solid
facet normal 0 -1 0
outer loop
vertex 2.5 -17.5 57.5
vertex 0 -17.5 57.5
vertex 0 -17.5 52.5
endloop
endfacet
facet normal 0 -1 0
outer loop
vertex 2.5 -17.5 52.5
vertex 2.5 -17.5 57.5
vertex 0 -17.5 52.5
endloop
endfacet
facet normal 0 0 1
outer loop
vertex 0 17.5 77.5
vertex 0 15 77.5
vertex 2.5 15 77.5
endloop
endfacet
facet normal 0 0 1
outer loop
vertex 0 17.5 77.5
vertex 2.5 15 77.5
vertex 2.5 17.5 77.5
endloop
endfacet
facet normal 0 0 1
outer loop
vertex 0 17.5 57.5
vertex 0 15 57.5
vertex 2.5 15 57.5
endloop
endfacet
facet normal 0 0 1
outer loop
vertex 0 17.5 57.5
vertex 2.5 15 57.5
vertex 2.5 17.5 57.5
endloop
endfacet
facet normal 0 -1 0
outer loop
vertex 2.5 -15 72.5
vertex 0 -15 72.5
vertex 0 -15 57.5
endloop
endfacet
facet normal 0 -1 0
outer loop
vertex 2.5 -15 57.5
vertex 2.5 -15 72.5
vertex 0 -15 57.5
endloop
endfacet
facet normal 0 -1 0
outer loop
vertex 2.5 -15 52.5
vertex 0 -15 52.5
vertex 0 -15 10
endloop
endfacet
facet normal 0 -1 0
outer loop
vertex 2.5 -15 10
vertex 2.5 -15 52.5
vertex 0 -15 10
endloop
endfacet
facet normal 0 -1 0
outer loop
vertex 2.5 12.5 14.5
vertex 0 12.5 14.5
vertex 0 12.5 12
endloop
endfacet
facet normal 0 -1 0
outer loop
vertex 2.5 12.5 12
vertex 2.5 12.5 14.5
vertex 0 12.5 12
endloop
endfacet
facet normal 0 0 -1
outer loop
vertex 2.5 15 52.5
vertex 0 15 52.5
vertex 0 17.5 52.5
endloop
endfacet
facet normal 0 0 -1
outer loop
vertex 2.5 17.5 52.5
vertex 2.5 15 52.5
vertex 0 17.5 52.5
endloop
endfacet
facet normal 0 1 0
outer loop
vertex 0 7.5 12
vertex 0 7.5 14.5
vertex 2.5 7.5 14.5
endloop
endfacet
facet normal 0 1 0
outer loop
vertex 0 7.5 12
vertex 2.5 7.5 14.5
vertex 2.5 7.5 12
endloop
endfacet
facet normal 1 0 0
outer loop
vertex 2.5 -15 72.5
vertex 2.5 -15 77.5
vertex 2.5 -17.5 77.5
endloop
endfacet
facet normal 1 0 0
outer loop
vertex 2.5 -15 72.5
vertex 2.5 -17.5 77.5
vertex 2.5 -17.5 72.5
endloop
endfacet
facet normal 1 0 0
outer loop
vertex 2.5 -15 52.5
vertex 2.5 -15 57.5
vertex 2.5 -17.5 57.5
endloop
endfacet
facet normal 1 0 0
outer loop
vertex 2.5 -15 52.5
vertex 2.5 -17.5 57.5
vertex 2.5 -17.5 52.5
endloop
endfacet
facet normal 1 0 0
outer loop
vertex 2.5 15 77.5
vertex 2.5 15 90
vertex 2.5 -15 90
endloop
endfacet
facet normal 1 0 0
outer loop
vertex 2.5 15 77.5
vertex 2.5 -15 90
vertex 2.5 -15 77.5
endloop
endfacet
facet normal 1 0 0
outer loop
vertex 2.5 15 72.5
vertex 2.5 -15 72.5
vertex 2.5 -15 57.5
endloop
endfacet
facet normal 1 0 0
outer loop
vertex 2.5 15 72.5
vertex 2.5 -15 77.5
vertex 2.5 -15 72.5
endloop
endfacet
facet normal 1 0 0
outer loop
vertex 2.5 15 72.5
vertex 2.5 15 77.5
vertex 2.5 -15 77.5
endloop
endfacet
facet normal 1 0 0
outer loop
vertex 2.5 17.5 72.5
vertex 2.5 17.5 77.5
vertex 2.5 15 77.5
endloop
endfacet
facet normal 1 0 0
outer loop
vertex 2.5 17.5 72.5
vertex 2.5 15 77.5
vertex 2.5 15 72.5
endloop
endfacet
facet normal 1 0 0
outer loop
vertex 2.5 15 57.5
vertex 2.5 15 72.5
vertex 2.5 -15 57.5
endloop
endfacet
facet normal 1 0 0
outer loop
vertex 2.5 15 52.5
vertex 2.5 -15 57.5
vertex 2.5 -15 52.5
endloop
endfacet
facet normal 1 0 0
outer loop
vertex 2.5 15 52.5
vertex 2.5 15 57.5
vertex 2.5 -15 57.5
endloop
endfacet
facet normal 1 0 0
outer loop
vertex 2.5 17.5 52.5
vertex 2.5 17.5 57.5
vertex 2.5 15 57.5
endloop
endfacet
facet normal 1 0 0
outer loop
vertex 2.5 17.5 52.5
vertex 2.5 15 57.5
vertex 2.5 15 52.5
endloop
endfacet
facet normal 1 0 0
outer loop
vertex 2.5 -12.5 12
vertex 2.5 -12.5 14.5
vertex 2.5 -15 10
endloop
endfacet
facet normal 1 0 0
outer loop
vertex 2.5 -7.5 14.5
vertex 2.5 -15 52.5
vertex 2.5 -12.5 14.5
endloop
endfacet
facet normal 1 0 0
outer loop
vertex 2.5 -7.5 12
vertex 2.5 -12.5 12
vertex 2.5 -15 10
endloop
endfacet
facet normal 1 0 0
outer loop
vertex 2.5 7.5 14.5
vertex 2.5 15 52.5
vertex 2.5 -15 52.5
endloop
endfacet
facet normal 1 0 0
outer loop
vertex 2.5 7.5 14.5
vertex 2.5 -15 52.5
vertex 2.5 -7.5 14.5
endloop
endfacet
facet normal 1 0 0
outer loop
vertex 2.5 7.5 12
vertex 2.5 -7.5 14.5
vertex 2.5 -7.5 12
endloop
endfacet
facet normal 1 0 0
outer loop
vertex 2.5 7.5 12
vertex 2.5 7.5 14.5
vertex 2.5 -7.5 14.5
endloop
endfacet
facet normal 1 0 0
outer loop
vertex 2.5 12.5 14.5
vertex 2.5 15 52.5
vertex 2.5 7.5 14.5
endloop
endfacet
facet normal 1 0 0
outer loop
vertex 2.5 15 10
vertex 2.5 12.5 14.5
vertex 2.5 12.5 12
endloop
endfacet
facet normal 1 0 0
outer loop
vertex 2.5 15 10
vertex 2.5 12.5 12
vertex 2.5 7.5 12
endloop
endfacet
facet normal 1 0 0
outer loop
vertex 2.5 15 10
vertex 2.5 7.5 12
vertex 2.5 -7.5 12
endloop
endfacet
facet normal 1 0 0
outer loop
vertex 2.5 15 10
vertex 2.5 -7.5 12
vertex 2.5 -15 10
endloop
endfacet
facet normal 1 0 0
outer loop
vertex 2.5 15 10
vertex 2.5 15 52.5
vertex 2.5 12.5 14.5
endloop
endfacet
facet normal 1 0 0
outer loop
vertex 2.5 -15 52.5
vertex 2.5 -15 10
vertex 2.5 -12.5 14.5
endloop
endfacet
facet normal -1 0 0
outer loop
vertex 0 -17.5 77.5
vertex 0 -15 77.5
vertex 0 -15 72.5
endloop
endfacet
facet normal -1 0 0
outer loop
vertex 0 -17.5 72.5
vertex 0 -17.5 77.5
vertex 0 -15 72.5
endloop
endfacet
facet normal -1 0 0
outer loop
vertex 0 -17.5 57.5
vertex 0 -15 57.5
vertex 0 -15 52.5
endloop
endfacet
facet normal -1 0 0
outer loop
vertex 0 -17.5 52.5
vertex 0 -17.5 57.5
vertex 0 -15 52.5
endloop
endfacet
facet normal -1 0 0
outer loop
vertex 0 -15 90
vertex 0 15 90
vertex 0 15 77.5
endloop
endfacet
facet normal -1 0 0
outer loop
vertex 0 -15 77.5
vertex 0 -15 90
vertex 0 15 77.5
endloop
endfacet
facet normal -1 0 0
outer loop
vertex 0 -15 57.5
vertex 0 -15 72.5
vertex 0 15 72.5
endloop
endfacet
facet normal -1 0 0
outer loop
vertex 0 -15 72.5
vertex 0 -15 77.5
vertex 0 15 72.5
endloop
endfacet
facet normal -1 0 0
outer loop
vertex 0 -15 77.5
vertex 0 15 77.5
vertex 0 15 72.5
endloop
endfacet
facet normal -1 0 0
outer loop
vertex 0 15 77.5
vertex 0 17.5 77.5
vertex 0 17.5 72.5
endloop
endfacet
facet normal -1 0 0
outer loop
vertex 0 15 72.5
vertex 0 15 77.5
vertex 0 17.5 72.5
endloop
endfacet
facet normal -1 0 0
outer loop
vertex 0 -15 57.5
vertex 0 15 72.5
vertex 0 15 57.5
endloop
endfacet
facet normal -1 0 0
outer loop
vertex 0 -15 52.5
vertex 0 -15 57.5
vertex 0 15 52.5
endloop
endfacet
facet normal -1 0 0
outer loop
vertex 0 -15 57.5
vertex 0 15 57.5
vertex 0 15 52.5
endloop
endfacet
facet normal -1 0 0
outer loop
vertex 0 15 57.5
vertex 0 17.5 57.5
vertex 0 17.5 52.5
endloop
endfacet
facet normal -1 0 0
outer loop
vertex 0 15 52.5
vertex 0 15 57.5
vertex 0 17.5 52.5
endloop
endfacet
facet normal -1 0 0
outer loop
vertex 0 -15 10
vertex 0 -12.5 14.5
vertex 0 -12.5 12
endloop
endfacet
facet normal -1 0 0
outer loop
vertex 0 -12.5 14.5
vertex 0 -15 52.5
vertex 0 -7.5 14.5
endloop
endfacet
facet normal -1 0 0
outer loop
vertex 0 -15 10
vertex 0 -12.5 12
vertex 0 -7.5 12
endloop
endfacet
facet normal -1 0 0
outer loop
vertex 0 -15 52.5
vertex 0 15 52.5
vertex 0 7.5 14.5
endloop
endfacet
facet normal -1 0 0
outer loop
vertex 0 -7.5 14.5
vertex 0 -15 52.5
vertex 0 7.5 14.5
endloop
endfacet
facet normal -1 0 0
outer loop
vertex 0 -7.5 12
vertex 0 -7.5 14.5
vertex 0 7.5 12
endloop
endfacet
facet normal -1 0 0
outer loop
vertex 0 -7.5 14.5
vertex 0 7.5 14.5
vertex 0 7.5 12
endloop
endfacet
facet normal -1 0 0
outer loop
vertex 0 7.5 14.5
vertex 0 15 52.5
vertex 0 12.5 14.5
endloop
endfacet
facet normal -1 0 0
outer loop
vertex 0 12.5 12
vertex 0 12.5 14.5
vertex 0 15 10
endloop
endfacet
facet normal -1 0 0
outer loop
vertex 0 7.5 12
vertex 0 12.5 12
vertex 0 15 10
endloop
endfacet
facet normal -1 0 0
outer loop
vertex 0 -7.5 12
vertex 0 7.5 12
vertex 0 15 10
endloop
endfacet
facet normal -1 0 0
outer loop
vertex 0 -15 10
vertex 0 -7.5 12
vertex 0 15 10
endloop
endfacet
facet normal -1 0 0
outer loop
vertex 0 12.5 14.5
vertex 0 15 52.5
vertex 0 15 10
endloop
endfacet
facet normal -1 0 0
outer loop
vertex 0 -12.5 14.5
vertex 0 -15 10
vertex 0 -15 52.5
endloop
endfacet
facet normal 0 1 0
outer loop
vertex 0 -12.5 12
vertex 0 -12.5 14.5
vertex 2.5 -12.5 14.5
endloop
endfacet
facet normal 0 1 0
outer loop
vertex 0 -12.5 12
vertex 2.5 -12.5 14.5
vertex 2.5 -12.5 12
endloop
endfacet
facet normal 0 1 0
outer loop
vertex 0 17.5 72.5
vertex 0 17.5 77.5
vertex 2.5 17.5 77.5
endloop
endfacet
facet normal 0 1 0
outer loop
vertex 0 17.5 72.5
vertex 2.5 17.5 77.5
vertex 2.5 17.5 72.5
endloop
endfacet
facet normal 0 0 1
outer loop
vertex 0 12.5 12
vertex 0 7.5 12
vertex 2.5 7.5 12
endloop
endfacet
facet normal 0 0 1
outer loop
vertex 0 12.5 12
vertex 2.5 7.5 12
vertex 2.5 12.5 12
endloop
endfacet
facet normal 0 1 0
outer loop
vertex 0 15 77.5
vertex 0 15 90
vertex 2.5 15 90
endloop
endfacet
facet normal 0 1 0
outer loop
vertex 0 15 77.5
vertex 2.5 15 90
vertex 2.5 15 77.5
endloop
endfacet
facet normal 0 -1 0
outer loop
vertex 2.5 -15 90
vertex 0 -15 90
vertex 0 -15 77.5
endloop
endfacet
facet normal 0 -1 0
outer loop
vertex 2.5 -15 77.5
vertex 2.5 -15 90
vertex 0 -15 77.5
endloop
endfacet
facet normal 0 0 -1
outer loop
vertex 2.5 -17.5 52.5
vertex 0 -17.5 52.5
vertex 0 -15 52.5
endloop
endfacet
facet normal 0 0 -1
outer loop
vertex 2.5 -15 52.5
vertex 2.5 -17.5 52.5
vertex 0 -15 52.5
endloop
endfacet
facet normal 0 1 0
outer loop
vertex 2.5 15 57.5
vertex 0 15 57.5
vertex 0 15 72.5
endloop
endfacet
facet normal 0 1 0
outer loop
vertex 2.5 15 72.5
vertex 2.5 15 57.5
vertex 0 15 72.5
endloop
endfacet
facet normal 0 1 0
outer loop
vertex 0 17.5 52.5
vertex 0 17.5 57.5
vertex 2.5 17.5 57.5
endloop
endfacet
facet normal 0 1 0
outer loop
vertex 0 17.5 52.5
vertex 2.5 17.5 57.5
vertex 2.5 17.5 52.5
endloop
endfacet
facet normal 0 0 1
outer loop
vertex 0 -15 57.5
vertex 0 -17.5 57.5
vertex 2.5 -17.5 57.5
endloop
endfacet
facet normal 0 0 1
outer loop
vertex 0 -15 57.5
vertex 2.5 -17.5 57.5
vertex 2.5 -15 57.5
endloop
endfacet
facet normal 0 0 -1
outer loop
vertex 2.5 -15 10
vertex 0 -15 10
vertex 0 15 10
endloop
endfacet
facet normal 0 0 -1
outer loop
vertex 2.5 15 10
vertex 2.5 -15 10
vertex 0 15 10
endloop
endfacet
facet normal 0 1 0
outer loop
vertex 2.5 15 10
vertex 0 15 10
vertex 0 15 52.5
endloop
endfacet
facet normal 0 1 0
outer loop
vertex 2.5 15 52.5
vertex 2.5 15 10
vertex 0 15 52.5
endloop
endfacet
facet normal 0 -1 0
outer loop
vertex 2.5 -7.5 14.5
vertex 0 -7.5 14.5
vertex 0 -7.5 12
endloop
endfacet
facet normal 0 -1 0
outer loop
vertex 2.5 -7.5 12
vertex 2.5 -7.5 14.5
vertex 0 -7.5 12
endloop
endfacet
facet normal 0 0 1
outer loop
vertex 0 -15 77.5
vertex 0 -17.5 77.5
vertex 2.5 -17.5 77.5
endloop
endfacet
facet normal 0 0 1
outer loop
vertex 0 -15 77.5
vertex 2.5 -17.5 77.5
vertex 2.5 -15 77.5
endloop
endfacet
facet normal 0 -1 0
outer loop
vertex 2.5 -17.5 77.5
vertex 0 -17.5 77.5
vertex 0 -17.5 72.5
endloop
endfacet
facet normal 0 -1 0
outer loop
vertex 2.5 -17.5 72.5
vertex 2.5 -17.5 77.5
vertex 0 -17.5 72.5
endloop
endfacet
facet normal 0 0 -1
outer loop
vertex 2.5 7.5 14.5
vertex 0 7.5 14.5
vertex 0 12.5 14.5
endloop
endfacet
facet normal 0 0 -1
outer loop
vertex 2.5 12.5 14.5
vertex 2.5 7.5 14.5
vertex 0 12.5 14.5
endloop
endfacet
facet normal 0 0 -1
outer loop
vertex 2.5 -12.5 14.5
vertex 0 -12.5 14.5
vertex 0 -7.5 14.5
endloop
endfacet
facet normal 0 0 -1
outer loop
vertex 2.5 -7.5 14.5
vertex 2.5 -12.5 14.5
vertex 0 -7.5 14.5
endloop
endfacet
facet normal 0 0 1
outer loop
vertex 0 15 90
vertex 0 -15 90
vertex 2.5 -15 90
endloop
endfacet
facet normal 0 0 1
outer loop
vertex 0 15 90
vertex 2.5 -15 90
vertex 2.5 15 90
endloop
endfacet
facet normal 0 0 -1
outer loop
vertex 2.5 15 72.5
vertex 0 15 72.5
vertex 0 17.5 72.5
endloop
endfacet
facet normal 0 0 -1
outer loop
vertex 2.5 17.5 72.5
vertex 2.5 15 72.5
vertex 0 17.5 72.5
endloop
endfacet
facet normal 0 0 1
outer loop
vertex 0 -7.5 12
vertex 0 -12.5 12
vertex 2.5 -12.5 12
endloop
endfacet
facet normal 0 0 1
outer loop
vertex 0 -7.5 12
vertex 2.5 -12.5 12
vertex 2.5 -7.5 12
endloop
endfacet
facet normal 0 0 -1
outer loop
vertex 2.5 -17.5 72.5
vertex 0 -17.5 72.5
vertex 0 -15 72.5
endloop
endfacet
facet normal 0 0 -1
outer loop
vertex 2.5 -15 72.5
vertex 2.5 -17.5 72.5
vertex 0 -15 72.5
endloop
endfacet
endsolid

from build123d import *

# Parameters (mm, degrees)
SKETCH1_3_W         = 2.5
SKETCH1_3_H         = 5
BOSS_EXTRUDE2_DEPTH = 2.5


with BuildPart() as part:
    # Sketch1<3> → Boss-Extrude2 (new body)
    with BuildSketch(Plane(origin=(0, 0, 0), x_dir=(0, 0, -1), z_dir=(1, 0, 0))):
        Polygon((-57.5, 17.5), (-57.5, 15), (-72.5, 15), (-72.5, 17.5), (-77.5, 17.5), (-77.5, 15), (-90, 15), (-90, -15), (-77.5, -15), (-77.5, -17.5), (-72.5, -17.5), (-72.5, -15), (-57.5, -15), (-57.5, -17.5), (-52.5, -17.5), (-52.5, -15), (-10, -15), (-10, 15), (-52.5, 15), (-52.5, 17.5), align=None)
        with Locations((-13.25, 10)):
            Rectangle(SKETCH1_3_W, SKETCH1_3_H, mode=Mode.SUBTRACT)
        with Locations((-13.25, -10)):
            Rectangle(SKETCH1_3_W, SKETCH1_3_H, mode=Mode.SUBTRACT)
    extrude(amount=BOSS_EXTRUDE2_DEPTH)


solid = part.part
